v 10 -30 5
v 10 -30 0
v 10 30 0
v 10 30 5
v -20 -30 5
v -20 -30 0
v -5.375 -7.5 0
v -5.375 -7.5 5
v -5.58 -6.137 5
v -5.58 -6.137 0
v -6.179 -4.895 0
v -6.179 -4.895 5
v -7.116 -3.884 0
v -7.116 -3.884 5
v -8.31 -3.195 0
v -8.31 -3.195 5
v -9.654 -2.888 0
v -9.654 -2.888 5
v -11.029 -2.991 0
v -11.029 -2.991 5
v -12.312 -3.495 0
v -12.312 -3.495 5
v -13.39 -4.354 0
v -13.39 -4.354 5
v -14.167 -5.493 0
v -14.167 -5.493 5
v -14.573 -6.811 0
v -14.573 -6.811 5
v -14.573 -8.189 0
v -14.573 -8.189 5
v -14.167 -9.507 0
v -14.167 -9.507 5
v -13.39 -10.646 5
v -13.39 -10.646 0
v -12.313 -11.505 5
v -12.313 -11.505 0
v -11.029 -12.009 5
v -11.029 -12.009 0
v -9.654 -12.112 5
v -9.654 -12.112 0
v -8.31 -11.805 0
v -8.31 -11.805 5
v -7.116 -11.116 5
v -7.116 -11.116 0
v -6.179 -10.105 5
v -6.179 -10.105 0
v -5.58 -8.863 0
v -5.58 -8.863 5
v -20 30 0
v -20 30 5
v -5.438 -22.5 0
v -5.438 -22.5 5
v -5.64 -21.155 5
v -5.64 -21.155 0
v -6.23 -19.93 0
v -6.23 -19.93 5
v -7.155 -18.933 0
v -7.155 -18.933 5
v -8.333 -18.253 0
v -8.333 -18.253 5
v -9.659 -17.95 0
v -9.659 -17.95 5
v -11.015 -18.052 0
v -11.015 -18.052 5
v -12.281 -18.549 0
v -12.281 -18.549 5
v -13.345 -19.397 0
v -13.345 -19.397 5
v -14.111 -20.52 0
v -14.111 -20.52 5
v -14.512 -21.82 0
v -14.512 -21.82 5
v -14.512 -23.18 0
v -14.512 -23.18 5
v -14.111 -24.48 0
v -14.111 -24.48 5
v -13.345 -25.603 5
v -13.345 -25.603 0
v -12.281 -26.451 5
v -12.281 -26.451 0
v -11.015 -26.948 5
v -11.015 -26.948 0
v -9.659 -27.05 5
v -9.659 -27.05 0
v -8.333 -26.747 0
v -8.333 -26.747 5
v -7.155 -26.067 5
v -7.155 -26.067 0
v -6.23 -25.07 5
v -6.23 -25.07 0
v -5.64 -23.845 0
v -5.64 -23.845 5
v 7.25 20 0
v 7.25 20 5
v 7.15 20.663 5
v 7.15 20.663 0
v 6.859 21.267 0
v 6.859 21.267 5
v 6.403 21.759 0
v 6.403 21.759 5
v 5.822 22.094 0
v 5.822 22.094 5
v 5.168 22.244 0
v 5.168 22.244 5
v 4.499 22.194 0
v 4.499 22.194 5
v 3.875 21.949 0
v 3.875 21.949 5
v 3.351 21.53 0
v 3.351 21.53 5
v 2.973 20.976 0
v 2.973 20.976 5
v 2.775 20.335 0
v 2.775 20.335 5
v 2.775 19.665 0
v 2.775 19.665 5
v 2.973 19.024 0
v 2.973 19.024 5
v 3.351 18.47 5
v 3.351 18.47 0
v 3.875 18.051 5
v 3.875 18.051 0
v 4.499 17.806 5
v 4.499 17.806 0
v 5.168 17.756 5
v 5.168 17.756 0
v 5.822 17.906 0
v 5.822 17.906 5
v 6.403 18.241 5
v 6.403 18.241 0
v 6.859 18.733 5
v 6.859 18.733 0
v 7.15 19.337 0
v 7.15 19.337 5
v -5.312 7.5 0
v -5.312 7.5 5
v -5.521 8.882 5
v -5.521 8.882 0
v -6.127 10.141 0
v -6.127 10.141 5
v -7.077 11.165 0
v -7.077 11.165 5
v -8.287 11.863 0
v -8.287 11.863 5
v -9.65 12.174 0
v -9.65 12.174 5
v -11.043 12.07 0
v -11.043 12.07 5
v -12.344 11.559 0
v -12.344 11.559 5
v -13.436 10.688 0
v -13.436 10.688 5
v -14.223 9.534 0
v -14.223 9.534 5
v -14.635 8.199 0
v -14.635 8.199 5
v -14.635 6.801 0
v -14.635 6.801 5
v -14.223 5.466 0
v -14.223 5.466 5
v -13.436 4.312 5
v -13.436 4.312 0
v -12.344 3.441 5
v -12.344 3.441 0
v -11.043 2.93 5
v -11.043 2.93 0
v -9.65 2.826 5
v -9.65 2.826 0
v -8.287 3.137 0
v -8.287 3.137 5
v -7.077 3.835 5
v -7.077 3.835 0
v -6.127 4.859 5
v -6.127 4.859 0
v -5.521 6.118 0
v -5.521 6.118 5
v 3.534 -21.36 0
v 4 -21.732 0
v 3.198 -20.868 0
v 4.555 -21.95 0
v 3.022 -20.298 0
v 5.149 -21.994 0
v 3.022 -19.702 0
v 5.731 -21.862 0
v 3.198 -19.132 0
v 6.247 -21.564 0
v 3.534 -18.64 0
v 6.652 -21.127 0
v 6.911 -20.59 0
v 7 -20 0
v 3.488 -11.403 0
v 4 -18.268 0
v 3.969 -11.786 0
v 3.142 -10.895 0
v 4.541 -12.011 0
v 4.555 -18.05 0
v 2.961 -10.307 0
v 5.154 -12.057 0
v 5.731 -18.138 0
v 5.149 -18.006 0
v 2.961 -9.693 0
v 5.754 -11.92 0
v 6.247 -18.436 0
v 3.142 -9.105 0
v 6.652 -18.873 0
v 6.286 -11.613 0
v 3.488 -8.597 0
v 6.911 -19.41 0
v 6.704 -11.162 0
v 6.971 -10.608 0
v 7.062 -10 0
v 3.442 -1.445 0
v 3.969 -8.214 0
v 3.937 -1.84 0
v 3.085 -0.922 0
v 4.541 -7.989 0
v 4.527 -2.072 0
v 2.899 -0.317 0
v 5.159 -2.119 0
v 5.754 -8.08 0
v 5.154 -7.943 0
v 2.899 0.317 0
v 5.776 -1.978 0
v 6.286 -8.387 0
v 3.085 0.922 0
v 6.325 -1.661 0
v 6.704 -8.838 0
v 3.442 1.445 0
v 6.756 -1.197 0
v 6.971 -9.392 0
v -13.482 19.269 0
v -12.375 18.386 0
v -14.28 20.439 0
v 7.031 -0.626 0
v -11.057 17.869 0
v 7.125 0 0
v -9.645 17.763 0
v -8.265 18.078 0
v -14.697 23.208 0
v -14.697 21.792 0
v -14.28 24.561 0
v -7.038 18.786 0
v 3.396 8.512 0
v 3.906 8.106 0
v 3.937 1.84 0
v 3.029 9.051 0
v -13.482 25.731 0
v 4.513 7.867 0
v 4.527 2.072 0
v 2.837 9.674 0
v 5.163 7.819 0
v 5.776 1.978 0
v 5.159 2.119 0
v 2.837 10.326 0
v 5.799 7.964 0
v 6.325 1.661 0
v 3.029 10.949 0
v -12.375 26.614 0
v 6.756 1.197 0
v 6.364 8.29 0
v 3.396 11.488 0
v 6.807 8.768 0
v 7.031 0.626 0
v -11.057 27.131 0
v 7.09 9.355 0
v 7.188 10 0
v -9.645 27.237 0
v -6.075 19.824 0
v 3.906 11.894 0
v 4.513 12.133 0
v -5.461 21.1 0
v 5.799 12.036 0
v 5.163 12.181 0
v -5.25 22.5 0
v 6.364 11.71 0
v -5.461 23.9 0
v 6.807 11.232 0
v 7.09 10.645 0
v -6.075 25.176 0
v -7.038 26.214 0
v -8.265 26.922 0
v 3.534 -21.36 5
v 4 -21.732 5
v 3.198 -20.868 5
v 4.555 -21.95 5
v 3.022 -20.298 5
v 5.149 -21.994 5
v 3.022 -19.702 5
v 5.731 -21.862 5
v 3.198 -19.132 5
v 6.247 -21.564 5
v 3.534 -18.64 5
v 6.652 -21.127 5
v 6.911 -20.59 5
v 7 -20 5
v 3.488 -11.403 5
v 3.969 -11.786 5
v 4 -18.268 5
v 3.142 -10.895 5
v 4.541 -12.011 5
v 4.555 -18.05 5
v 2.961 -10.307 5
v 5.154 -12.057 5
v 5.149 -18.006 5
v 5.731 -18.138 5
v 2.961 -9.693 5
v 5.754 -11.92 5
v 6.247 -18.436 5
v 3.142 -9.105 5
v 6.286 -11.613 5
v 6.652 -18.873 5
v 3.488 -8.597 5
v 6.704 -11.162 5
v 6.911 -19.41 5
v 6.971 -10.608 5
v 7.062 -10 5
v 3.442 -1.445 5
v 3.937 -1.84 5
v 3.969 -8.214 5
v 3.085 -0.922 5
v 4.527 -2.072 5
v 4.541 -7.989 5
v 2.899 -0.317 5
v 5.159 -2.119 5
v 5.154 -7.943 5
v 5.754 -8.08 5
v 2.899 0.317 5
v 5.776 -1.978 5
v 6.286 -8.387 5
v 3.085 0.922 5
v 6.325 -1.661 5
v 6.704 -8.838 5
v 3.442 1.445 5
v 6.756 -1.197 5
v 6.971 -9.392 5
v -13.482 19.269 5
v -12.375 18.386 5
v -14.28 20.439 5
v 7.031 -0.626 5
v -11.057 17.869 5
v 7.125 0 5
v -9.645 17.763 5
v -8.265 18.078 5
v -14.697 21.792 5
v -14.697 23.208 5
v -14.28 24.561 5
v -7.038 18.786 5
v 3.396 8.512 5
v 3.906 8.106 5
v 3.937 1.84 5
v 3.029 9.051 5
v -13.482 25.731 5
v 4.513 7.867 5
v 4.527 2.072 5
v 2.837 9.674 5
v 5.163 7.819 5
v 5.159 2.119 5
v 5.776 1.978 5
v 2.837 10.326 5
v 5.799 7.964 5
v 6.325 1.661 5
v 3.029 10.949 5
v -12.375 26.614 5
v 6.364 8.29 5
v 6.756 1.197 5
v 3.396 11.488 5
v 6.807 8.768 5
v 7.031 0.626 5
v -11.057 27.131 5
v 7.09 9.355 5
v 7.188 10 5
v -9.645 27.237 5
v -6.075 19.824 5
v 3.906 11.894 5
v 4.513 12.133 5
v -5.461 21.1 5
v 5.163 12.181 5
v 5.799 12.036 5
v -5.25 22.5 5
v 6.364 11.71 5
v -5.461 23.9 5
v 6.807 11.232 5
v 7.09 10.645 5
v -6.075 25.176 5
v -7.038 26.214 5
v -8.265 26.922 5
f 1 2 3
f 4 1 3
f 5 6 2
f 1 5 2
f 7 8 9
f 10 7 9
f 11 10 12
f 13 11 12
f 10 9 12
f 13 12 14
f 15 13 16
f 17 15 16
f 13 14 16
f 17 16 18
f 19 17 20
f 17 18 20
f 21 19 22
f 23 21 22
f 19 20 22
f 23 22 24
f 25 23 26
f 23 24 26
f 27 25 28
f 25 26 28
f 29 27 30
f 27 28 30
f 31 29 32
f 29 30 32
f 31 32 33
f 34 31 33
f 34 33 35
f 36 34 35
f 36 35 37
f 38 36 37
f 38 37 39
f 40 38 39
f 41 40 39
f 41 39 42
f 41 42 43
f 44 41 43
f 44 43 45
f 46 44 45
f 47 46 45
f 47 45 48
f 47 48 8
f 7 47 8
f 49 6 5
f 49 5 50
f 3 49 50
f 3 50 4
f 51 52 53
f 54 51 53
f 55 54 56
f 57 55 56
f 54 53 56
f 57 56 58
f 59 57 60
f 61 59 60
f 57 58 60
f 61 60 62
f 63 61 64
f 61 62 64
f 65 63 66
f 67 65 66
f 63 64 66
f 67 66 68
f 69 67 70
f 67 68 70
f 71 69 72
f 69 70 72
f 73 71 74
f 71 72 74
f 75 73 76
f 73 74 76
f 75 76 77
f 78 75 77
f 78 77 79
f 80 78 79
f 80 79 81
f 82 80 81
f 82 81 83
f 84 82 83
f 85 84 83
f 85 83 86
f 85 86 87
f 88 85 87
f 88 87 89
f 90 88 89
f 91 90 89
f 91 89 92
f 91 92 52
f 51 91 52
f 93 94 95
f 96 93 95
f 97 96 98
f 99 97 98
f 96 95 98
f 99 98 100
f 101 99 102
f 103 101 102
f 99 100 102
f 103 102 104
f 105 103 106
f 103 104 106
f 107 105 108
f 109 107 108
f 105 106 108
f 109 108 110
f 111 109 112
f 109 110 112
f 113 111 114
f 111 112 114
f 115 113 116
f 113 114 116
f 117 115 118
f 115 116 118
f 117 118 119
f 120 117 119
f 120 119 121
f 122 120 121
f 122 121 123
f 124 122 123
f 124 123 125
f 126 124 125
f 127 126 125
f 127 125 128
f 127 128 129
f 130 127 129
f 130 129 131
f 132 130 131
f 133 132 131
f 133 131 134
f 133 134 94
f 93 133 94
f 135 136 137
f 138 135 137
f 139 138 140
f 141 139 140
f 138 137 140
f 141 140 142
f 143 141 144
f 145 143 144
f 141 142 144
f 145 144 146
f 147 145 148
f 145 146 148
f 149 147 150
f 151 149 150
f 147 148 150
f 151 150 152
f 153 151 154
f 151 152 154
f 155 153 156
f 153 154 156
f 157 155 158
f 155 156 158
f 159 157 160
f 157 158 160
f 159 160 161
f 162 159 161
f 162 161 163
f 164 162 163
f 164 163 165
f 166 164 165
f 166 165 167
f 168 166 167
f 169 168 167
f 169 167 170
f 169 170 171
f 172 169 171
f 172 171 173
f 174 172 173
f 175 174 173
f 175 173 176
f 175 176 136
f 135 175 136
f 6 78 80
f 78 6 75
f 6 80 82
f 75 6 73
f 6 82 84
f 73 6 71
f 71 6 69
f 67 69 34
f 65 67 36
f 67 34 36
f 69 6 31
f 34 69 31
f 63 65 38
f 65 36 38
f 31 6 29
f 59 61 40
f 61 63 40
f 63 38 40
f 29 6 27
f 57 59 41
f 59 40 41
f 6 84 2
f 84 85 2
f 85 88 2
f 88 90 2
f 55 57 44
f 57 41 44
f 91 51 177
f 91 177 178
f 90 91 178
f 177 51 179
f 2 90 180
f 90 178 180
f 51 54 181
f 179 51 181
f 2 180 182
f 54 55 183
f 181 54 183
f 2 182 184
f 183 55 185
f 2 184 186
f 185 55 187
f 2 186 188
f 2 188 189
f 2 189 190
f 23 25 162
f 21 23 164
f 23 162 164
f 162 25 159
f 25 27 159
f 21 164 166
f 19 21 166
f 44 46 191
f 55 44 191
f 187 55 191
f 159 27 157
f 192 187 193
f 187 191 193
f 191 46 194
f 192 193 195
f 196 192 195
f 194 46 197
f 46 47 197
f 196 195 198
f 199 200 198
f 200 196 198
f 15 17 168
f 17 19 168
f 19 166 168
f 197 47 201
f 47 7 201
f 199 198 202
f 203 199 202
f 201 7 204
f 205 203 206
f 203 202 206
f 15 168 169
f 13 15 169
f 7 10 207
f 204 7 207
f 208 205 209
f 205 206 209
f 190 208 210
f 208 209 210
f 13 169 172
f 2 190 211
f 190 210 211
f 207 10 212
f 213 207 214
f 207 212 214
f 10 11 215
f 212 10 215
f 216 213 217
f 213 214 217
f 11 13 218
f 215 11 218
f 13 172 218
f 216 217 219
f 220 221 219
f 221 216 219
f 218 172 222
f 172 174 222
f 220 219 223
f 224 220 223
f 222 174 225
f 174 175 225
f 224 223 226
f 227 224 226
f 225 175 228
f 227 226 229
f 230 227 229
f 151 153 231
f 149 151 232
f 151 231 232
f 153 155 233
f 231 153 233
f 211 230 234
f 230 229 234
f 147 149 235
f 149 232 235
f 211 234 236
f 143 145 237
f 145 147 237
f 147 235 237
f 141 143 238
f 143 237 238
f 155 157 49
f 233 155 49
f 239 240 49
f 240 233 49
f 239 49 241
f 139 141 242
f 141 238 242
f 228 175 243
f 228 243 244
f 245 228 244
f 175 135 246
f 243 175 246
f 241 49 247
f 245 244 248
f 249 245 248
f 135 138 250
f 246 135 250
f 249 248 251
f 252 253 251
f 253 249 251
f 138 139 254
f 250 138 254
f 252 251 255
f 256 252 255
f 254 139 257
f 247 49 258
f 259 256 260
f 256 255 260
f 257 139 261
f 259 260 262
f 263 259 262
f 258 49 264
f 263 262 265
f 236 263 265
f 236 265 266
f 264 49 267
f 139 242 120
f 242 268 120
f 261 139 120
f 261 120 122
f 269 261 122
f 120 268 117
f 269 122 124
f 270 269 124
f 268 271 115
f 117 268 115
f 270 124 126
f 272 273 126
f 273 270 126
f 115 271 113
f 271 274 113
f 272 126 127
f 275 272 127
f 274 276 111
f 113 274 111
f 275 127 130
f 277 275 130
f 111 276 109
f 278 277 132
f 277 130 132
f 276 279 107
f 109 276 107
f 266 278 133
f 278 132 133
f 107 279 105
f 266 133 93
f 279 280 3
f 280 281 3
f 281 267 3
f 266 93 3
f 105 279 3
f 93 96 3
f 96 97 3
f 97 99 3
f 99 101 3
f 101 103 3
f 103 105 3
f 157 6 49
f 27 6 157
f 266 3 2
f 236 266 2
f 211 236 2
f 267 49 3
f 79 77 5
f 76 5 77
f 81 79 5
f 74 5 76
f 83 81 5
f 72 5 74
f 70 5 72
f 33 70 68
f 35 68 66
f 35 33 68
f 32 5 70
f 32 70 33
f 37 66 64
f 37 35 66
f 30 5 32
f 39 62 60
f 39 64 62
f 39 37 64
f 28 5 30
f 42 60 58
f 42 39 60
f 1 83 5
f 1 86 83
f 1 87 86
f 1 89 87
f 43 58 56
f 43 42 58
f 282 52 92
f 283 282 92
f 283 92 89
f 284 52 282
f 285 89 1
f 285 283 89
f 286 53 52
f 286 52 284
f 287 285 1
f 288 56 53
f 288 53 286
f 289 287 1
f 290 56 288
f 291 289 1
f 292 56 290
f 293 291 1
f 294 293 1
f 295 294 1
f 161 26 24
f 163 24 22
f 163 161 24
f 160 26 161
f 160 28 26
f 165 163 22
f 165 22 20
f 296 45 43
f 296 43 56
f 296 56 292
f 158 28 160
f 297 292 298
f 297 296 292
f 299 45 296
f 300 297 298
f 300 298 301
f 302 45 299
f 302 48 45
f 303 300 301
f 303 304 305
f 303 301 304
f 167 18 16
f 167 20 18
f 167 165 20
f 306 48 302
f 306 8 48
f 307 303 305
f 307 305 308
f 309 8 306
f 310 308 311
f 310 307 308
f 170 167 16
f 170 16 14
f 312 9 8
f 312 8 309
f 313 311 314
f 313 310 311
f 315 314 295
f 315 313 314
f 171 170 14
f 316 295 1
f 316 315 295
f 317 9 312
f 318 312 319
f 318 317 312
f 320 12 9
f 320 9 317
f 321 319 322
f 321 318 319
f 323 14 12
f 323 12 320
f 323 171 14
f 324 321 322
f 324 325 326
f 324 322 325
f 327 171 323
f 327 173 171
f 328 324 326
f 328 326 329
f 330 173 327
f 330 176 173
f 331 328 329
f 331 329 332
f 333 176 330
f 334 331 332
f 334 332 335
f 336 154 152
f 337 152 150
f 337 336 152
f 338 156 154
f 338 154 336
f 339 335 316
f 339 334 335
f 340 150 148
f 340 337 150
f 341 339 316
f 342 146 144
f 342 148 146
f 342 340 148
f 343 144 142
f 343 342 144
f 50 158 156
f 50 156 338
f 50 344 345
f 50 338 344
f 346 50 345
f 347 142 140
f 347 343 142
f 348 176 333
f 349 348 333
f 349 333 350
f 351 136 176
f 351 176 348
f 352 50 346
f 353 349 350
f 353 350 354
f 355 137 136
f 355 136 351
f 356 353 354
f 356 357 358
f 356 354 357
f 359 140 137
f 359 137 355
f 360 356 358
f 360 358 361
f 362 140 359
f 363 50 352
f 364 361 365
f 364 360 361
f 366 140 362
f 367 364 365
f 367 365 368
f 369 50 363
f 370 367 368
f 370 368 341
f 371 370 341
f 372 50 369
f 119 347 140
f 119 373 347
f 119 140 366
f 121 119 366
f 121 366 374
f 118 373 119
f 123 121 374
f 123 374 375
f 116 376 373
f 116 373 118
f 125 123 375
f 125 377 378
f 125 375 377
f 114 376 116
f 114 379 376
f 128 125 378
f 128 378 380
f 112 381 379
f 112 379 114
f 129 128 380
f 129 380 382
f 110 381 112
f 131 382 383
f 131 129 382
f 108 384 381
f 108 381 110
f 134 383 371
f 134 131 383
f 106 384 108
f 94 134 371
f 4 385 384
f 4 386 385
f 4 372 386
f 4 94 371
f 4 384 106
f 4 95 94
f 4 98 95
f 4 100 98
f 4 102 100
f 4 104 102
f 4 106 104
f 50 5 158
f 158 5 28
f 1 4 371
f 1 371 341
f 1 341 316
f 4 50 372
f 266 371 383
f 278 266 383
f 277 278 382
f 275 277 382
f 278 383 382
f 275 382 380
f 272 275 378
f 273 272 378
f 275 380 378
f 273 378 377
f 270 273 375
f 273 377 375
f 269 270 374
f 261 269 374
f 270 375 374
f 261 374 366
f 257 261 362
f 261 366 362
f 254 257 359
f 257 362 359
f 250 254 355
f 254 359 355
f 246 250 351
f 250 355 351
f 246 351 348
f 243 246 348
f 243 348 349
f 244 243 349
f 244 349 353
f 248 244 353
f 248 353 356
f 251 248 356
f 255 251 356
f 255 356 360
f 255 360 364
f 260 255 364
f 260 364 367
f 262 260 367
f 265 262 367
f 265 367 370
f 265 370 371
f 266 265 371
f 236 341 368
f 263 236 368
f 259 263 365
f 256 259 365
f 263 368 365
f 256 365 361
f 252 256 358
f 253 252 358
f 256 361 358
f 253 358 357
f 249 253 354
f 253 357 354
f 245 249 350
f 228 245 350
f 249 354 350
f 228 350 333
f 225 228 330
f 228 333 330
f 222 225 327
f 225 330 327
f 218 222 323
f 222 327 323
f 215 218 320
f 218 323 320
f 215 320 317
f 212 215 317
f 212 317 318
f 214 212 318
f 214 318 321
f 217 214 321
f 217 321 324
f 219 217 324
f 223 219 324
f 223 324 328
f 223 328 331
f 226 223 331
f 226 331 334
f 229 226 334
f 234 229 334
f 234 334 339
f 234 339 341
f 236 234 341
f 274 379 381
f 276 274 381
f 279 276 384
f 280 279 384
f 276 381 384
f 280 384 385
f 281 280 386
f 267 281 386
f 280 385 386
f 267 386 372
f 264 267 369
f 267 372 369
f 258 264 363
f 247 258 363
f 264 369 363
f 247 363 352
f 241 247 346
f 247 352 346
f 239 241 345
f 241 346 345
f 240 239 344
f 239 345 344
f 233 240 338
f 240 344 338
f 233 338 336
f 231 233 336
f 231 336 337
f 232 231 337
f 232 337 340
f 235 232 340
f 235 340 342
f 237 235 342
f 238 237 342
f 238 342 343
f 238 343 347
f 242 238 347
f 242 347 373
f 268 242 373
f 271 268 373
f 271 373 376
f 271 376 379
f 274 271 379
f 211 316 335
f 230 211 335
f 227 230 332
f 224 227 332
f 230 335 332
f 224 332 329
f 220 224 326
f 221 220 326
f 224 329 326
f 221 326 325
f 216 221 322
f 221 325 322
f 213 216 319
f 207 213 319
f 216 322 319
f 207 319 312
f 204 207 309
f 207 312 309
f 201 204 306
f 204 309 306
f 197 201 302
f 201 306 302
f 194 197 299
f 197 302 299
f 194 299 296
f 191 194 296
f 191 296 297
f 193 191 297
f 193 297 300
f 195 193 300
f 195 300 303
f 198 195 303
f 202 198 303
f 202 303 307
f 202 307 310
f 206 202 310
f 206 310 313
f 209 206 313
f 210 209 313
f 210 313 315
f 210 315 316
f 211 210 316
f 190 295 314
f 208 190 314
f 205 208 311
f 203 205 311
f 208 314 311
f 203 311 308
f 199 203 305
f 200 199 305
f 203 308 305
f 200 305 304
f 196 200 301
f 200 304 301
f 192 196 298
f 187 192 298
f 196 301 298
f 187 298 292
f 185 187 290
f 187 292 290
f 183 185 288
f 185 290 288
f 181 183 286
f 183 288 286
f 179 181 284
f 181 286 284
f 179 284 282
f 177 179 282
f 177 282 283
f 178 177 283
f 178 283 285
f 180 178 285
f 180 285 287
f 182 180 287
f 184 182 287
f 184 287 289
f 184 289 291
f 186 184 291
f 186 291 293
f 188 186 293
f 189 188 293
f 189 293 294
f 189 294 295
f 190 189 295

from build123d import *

# Parameters (mm, degrees)
F0_W     = 30
F0_H     = 60
F1_DEPTH = 5
F2_R     = 4.75
F2_R_2   = 4.6875
F2_R_3   = 4.625
F2_R_4   = 4.5625
F2_R_5   = 2
F2_R_6   = 2.0625
F2_R_7   = 2.125
F2_R_8   = 2.1875
F2_R_9   = 2.25
F3_DEPTH = 5.001


with BuildPart() as f1:
    # F0 (on Top) → F1 (new body)
    with BuildSketch(Plane.XY):
        with Locations((-5, 0)):
            Rectangle(F0_W, F0_H)
    extrude(amount=F1_DEPTH)

    # F2 (on face) → F3 (cut, through all)
    with BuildSketch(Plane.XY.offset(5)):
        with Locations((-10, 22.5)):
            Circle(F2_R)
        with Locations((-10, 7.5)):
            Circle(F2_R_2)
        with Locations((-10, -7.5)):
            Circle(F2_R_3)
        with Locations((-10, -22.5)):
            Circle(F2_R_4)
        with Locations((5, -20)):
            Circle(F2_R_5)
        with Locations((5, -10)):
            Circle(F2_R_6)
        with Locations((5, 0)):
            Circle(F2_R_7)
        with Locations((5, 10)):
            Circle(F2_R_8)
        with Locations((5, 20)):
            Circle(F2_R_9)
    extrude(amount=-F3_DEPTH, mode=Mode.SUBTRACT)


solid = f1.part
